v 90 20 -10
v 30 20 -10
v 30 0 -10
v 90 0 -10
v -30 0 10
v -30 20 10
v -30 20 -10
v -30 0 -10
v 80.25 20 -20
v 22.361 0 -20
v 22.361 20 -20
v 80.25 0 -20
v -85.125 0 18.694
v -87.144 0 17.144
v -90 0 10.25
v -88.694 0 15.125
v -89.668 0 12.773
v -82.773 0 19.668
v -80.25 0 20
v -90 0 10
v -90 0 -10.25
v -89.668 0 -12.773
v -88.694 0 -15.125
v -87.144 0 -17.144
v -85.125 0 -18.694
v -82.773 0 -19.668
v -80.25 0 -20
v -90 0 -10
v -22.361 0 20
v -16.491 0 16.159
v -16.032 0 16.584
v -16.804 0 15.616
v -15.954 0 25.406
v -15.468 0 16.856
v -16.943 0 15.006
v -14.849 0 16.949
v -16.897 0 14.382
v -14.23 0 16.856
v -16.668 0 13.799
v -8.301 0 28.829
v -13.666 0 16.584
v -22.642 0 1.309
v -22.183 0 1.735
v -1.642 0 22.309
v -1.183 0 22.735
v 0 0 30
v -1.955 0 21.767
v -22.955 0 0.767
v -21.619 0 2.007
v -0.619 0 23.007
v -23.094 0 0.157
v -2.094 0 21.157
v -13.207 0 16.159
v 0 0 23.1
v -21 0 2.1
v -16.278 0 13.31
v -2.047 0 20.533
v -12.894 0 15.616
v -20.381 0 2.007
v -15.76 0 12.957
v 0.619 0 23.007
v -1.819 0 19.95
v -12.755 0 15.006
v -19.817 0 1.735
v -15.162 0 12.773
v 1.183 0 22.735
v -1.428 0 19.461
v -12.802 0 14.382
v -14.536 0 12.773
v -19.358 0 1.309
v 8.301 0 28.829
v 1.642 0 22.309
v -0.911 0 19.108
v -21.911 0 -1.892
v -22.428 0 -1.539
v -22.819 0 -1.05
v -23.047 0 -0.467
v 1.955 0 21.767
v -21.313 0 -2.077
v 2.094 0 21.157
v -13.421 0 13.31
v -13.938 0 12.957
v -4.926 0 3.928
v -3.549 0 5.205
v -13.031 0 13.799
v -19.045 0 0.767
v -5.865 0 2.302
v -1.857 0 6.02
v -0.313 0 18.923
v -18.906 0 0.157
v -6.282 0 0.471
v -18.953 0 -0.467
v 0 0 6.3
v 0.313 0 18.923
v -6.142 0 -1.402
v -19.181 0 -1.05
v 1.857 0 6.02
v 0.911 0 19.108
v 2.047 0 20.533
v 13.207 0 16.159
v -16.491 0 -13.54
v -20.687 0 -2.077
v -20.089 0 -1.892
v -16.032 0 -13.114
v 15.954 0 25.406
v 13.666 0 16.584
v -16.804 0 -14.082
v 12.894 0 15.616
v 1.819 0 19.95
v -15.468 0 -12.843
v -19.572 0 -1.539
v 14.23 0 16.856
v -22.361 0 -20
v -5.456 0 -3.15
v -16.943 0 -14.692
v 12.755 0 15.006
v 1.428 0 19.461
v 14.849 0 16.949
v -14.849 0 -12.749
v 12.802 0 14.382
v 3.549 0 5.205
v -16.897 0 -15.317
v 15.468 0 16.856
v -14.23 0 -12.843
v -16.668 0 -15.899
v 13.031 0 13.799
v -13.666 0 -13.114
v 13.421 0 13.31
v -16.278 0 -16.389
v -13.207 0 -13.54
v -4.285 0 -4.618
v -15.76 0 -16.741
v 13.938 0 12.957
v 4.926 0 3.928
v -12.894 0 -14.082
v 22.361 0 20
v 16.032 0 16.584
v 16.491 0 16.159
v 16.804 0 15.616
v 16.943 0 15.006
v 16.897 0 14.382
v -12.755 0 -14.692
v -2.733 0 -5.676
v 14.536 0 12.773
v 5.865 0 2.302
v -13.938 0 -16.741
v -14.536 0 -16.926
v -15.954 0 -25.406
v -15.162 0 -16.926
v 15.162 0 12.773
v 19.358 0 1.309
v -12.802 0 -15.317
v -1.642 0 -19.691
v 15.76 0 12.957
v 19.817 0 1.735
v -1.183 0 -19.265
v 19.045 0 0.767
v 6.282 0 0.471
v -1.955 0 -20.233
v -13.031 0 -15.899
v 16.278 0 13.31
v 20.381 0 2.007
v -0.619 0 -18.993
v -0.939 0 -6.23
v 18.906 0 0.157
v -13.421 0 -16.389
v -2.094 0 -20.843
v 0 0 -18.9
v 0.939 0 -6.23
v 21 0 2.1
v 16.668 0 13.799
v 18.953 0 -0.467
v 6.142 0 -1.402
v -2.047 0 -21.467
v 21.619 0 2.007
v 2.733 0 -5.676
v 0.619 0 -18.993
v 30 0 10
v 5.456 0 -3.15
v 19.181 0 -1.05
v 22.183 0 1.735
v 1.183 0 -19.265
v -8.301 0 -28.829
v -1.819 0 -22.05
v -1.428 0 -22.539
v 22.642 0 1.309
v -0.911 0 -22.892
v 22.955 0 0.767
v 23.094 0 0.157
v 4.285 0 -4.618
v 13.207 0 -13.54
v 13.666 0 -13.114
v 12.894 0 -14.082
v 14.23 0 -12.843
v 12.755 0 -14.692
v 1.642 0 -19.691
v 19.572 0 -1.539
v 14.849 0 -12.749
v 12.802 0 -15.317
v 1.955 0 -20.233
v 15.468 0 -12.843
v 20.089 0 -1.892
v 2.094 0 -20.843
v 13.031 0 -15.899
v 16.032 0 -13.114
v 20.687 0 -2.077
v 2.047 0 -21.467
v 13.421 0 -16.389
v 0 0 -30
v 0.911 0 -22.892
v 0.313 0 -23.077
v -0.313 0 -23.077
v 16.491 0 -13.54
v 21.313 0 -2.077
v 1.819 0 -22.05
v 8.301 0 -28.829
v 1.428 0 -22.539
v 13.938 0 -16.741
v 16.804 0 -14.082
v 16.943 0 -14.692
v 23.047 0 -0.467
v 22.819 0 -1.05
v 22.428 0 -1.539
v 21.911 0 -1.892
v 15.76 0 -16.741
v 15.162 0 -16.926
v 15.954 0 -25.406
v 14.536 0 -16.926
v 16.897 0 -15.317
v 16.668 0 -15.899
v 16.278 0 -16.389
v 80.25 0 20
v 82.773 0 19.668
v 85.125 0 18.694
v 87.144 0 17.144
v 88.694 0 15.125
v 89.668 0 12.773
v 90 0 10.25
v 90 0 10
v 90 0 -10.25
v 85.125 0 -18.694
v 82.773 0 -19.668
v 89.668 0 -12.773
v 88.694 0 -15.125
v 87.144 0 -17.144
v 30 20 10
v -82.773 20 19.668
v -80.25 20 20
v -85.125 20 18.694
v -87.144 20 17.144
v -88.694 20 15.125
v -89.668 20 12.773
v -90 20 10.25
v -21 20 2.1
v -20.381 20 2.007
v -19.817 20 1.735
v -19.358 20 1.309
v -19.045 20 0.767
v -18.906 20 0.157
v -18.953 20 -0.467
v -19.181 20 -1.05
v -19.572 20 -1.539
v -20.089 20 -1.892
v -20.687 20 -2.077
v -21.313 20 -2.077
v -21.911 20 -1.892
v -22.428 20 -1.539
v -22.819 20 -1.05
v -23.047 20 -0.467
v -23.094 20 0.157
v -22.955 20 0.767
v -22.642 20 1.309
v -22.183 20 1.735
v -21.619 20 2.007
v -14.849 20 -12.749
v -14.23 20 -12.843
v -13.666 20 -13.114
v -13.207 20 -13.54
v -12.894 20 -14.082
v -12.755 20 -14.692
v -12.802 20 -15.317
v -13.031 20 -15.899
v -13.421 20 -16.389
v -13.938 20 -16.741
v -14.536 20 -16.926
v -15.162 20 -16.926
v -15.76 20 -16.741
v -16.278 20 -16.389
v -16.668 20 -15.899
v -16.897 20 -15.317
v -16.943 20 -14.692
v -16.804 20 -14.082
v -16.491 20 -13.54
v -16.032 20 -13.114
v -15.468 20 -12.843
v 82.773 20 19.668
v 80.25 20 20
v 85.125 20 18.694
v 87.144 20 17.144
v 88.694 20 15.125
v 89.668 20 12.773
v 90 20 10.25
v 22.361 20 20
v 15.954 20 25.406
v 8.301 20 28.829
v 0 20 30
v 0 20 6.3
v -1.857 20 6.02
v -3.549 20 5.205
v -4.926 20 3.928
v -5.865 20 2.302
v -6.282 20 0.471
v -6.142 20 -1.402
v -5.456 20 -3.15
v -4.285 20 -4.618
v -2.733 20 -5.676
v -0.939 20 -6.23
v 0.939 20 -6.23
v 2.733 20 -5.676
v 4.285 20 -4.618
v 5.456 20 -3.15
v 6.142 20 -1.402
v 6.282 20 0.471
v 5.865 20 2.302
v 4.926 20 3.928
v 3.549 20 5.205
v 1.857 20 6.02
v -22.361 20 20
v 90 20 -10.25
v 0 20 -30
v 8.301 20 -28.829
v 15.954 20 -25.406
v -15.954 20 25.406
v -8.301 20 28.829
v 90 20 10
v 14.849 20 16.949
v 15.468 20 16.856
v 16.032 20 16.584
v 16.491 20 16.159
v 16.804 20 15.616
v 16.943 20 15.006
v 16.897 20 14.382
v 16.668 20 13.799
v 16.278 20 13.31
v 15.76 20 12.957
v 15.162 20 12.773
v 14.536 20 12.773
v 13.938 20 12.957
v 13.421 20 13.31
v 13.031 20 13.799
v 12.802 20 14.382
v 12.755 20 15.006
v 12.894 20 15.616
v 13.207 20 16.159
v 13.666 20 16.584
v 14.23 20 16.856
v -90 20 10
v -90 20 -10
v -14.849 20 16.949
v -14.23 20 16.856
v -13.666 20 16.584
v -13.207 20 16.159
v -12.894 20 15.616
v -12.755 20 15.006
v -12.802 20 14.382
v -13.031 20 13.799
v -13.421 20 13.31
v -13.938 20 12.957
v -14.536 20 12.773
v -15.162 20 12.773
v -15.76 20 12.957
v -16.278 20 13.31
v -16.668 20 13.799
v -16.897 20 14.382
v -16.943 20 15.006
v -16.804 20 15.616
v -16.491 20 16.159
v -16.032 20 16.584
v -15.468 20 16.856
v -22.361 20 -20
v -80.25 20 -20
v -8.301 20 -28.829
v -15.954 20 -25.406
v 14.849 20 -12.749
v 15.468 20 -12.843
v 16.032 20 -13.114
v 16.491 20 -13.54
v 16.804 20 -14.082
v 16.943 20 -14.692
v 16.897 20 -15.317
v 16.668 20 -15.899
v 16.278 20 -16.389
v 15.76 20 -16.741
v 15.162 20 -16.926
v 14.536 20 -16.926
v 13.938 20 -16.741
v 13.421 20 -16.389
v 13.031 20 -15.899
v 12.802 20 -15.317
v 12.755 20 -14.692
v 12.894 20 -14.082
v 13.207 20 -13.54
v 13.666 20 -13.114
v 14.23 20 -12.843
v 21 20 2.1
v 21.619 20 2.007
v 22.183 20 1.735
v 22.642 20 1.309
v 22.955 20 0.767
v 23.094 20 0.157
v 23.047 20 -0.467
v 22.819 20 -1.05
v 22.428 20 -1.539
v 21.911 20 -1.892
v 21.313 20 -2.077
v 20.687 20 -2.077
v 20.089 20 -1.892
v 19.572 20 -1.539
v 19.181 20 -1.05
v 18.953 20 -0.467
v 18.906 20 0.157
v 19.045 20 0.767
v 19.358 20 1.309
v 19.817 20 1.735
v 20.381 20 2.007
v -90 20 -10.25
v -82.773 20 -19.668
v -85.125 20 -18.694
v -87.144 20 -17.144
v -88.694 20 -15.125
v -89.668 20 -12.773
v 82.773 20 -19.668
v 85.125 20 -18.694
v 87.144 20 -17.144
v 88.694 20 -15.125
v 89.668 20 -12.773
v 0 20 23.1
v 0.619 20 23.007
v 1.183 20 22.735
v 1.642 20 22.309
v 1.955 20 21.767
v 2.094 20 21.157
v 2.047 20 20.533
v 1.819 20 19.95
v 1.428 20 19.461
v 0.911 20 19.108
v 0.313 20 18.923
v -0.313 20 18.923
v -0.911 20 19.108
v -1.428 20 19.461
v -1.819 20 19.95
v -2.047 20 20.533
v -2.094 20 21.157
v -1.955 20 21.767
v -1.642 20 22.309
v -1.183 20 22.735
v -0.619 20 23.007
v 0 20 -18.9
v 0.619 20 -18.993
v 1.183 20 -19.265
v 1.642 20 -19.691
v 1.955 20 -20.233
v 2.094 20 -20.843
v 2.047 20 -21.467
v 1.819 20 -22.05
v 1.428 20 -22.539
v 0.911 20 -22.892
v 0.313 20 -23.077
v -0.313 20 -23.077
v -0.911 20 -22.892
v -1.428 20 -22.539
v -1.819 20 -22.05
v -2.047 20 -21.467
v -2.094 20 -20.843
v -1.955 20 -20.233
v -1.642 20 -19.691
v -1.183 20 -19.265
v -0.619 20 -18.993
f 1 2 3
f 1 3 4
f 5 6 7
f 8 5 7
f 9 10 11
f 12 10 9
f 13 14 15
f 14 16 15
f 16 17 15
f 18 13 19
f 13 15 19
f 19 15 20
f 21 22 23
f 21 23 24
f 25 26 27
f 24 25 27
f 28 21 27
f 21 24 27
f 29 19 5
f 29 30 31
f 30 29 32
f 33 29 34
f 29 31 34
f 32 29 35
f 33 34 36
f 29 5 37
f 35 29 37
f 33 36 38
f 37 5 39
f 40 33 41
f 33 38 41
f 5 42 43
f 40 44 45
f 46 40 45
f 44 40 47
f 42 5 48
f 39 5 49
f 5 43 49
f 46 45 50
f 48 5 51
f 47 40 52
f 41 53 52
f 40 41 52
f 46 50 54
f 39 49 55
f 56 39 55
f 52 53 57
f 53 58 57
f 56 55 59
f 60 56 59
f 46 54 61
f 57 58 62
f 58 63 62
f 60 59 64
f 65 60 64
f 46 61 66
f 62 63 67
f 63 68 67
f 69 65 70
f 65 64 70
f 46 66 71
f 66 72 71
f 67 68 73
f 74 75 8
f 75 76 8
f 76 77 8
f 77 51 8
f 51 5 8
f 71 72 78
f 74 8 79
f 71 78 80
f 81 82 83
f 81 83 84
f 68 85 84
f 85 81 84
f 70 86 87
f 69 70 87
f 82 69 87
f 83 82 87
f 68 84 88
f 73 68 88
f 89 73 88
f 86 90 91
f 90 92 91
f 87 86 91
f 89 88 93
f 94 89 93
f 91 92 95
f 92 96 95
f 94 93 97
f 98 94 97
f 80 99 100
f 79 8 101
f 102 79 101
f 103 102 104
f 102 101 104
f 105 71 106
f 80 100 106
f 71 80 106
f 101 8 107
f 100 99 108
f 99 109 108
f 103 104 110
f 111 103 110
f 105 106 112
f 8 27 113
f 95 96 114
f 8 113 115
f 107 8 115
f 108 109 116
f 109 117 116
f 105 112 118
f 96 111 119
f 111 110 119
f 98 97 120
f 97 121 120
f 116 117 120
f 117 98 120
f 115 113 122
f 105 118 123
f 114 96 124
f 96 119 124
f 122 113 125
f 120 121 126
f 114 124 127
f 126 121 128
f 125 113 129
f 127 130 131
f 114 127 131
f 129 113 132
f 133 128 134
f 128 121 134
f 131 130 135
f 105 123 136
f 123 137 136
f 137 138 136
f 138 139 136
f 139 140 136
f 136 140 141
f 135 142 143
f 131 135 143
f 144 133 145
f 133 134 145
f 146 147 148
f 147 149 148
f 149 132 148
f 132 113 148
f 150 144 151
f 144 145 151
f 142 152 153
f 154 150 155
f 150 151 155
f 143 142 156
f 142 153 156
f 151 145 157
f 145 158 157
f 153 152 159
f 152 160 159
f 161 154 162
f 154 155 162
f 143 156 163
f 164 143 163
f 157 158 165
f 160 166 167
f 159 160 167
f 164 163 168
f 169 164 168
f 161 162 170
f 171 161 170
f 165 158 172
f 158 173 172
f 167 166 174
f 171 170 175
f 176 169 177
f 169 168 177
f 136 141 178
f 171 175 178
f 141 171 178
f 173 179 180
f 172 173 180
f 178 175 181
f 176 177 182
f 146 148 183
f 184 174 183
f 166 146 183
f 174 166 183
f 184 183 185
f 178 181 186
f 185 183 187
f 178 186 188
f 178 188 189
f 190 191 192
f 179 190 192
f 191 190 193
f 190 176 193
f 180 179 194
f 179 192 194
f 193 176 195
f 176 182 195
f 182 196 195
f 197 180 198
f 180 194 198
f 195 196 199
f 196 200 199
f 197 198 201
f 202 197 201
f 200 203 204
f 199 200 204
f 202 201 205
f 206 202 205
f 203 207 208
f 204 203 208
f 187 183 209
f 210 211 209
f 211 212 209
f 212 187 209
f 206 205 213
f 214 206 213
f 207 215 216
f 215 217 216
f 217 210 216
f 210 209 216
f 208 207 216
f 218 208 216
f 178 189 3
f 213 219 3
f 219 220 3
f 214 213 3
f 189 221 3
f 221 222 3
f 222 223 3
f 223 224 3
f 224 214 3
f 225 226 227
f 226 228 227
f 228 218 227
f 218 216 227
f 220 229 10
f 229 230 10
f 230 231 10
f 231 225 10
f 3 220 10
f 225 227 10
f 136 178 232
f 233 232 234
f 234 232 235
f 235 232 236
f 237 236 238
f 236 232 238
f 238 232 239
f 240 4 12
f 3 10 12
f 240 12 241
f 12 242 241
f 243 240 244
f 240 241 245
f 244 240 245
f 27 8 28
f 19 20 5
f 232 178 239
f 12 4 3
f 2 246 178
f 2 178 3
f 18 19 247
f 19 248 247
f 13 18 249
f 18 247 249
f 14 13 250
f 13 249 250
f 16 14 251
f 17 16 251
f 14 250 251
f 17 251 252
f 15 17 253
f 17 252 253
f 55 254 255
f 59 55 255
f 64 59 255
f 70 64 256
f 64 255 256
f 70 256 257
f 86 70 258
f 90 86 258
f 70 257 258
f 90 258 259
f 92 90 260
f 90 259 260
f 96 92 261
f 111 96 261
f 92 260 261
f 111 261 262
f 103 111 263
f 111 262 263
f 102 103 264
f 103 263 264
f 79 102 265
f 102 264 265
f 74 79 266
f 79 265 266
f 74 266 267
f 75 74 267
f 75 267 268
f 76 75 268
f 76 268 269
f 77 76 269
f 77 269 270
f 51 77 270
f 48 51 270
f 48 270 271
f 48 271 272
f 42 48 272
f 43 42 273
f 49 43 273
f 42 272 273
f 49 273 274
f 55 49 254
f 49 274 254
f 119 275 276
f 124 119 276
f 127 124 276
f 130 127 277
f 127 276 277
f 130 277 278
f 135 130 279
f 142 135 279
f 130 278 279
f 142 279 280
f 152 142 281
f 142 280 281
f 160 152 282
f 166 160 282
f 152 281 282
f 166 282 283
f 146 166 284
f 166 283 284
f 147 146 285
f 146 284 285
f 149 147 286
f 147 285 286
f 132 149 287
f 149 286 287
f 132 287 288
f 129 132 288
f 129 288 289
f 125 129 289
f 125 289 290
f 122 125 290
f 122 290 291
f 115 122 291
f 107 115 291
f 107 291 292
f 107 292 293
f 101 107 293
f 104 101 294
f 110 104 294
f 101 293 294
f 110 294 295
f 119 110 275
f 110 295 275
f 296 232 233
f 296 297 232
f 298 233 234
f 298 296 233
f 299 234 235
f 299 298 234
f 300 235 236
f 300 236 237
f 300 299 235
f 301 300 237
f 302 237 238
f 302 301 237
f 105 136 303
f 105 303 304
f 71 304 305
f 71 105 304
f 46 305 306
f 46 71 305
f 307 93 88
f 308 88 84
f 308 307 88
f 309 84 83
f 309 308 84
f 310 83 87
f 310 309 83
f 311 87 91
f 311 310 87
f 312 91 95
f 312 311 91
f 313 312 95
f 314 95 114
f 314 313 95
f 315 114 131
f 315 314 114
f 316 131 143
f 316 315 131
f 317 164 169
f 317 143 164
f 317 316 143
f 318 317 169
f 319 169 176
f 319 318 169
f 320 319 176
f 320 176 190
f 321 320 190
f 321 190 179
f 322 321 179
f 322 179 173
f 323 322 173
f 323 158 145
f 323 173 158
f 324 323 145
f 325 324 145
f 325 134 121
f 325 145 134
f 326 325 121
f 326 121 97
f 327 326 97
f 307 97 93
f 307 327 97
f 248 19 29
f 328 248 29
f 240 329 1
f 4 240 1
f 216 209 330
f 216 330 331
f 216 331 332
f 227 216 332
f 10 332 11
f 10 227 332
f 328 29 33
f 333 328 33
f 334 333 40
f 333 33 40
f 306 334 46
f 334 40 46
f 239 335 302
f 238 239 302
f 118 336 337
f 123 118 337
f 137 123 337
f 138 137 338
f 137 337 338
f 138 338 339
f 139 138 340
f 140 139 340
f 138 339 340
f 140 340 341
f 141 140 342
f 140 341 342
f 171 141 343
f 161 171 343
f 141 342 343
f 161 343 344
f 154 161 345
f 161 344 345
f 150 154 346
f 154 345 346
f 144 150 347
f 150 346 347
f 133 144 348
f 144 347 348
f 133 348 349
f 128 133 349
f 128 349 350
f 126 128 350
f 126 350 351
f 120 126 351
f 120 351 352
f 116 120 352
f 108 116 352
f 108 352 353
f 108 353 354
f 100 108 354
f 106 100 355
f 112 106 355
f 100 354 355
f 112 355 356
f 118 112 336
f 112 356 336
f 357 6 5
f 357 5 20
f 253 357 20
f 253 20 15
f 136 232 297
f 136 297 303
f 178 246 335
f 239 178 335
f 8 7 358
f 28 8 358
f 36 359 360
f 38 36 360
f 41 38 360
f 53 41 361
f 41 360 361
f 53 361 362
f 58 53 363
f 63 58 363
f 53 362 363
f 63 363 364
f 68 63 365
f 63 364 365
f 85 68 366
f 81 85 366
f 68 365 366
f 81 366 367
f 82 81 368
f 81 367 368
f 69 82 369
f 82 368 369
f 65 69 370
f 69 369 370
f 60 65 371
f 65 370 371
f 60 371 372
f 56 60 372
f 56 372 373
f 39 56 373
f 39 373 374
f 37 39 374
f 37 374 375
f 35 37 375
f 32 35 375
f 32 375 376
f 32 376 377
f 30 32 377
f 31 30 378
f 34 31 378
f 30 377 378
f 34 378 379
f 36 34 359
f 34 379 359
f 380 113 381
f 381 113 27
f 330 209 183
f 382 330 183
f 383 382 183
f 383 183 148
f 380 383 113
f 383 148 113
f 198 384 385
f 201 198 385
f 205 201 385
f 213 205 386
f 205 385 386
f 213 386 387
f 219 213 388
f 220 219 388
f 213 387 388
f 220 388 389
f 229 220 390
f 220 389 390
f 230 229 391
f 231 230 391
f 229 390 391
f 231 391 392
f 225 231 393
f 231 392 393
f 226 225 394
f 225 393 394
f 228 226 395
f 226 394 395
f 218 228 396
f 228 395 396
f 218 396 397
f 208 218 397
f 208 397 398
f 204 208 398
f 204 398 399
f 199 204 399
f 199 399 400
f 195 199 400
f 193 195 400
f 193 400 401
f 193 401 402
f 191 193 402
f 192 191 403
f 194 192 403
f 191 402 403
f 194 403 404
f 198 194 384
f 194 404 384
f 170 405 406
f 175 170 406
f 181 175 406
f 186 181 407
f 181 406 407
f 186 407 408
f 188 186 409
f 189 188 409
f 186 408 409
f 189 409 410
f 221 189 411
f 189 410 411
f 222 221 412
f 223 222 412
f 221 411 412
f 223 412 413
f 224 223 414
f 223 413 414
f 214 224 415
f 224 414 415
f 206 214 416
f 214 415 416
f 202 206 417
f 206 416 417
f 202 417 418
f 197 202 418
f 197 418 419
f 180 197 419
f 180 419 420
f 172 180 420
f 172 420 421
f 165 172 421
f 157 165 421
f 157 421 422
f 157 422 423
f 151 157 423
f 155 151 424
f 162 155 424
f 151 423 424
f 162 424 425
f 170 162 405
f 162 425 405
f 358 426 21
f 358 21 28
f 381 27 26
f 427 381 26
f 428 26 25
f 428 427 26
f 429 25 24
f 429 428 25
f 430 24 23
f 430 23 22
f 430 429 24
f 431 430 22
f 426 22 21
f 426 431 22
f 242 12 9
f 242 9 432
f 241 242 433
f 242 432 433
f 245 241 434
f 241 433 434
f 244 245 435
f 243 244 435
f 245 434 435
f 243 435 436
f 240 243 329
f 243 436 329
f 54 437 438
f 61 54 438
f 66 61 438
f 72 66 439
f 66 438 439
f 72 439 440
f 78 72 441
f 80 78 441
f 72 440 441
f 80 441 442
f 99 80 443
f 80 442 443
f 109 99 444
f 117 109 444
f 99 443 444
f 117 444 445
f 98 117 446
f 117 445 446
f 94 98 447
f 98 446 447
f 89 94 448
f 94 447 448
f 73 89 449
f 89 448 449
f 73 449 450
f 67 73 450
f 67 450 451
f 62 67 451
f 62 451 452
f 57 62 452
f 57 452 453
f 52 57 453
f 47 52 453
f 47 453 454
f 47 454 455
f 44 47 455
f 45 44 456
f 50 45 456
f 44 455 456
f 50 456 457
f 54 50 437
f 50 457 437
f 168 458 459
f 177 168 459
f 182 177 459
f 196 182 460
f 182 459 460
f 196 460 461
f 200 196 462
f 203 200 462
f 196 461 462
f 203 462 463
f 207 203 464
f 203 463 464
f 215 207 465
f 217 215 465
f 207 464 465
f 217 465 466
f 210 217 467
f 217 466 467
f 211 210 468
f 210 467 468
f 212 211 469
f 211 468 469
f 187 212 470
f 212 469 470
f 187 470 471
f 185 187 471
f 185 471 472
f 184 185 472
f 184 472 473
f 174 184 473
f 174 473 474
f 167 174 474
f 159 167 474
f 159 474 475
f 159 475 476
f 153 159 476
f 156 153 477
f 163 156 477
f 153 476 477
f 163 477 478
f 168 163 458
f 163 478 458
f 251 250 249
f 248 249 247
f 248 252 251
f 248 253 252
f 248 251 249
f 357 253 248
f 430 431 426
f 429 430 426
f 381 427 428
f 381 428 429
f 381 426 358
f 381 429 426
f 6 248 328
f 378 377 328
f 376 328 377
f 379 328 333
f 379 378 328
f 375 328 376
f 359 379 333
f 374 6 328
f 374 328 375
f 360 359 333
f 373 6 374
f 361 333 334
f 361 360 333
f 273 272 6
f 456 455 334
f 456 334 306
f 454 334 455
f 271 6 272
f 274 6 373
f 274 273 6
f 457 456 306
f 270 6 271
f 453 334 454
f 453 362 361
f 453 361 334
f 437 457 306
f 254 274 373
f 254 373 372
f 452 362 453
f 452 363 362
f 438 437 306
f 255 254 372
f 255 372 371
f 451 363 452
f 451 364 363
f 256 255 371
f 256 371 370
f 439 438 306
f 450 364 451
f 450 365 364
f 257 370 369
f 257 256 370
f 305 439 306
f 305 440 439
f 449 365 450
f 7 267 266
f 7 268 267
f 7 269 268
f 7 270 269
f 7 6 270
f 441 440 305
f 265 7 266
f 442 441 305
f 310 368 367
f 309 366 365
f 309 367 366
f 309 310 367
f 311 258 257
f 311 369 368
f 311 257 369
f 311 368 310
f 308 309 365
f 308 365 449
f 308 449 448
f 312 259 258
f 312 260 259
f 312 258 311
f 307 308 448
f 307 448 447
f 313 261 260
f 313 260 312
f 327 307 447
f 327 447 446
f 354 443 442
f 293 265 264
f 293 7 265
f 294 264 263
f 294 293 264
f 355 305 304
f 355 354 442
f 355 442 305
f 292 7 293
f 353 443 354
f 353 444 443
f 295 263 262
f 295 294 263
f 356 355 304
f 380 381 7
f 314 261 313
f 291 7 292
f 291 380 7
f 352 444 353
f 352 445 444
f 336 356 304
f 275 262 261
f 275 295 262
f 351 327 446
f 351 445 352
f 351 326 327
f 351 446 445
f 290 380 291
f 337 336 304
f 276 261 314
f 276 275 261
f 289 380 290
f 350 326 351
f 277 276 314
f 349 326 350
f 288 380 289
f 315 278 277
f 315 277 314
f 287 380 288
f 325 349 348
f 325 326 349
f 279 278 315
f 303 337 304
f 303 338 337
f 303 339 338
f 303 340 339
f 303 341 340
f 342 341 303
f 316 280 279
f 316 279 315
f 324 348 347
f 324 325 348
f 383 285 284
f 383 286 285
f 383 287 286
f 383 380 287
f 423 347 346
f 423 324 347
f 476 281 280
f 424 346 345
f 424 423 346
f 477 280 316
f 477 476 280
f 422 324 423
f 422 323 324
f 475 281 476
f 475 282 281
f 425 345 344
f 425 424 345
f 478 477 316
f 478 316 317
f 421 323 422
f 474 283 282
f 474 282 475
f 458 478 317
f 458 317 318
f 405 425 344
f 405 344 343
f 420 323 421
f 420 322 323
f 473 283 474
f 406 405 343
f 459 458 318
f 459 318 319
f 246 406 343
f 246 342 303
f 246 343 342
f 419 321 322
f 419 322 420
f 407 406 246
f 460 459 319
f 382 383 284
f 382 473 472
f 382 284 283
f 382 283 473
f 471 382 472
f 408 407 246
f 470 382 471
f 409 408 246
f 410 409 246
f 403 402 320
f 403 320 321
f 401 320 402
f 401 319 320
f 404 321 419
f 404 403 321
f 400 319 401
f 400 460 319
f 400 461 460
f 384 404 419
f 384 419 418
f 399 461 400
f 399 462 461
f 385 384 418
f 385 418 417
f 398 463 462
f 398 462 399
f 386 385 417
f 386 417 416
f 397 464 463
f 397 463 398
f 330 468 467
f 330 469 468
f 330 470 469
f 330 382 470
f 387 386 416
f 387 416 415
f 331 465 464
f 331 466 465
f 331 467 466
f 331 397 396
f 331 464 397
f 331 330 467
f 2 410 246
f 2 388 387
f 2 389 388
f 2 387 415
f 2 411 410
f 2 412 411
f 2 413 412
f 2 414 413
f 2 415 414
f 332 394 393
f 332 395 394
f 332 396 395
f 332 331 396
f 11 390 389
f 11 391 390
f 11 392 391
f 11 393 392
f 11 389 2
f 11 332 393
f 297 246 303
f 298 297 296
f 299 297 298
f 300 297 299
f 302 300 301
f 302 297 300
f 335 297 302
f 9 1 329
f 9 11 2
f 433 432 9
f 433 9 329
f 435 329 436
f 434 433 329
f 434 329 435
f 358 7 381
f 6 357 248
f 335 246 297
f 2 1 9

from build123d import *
from build123d.topology import SkipClean

# Parameters (mm, degrees)
BOSS_EXTRUDE1_DEPTH  = 20
SKETCH2_W            = 60
SKETCH2_H            = 20
CUT_EXTRUDE1_DEPTH   = 20
FILLET1_R            = 9.75
FILLET1_OF_MIRROR4_R = 9.75
SKETCH4_R            = 2.1
CUT_EXTRUDE3_DEPTH   = 20


with BuildPart() as part:
    # Sketch1 → Boss-Extrude1 (new body)
    with BuildSketch(Plane(origin=(0, 0, 0), x_dir=(1, 0, 0), z_dir=(0, 1, 0))):
        with BuildLine():
            Line((22.360679775, 20), (90, 20))
            Line((90, 20), (90, -20))
            Line((90, -20), (22.360679775, -20))
            ThreePointArc((22.360679775, -20), (12.247448714, -27.386127875), (0, -30))
            Line((0, -30), (0, -20))
            Line((0, -20), (0, 20))
            Line((0, 20), (0, 30))
            ThreePointArc((0, 30), (12.247448714, 27.386127875), (22.360679775, 20))
        make_face()
    boss_extrude1 = extrude(amount=BOSS_EXTRUDE1_DEPTH)

    # Sketch2 → Cut-Extrude1 (cut)
    with BuildSketch(Plane(origin=(0, 20, 0), x_dir=(1, 0, 0), z_dir=(0, 1, 0))):
        with BuildLine():
            Line((0, 6.3), (0, -6.3))
            ThreePointArc((0, -6.3), (6.3, 0), (0, 6.3))
        make_face()
        with Locations((60, 0)):
            Rectangle(SKETCH2_W, SKETCH2_H)
    cut_extrude1 = extrude(amount=-CUT_EXTRUDE1_DEPTH, mode=Mode.SUBTRACT)

    # Fillet1
    fillet1_edges = [part.edges().sort_by_distance(p)[0] for p in [
        (90, 10, -20),
        (90, 10, 20),
    ]]
    fillet(fillet1_edges, radius=FILLET1_R)

    # Mirror4: Boss-Extrude1, Cut-Extrude1 across plane
    with SkipClean():  # the faces are left unmerged after this step: merging them gives an invalid solid
        add(boss_extrude1.mirror(Plane(origin=(0, 0, 0), x_dir=(0, 0, 1), z_dir=(1, 0, 0))))
        add(cut_extrude1.mirror(Plane(origin=(0, 0, 0), x_dir=(0, 0, 1), z_dir=(1, 0, 0))), mode=Mode.SUBTRACT)
    add(part.part.scale(1), mode=Mode.REPLACE)  # the faces are merged on a copy

    # Fillet1 of Mirror4
    fillet1_of_mirror4_edges = [part.edges().sort_by_distance(p)[0] for p in [
        (-90, 10, -20),
        (-90, 10, 20),
    ]]
    fillet(fillet1_of_mirror4_edges, radius=FILLET1_OF_MIRROR4_R)

    # Sketch4 → Cut-Extrude3 (cut)
    with BuildSketch(Plane(origin=(0, 20, 0), x_dir=(1, 0, 0), z_dir=(0, 1, 0))):
        with Locations(Location((21, 0, 0), (0, 0, 270))):
            Circle(SKETCH4_R)
        with Locations(Location((14.849242405, -14.849242405, 0), (0, 0, 270))):
            Circle(SKETCH4_R)
        with Locations(Location((0, -21, 0), (0, 0, 270))):
            Circle(SKETCH4_R)
        with Locations(Location((-14.849242405, -14.849242405, 0), (0, 0, 270))):
            Circle(SKETCH4_R)
        with Locations(Location((-21, 0, 0), (0, 0, 270))):
            Circle(SKETCH4_R)
        with Locations(Location((-14.849242405, 14.849242405, 0), (0, 0, 270))):
            Circle(SKETCH4_R)
        with Locations(Location((0, 21, 0), (0, 0, 270))):
            Circle(SKETCH4_R)
        with Locations(Location((14.849242405, 14.849242405, 0), (0, 0, 270))):
            Circle(SKETCH4_R)
    extrude(amount=-CUT_EXTRUDE3_DEPTH, mode=Mode.SUBTRACT)


solid = part.part
